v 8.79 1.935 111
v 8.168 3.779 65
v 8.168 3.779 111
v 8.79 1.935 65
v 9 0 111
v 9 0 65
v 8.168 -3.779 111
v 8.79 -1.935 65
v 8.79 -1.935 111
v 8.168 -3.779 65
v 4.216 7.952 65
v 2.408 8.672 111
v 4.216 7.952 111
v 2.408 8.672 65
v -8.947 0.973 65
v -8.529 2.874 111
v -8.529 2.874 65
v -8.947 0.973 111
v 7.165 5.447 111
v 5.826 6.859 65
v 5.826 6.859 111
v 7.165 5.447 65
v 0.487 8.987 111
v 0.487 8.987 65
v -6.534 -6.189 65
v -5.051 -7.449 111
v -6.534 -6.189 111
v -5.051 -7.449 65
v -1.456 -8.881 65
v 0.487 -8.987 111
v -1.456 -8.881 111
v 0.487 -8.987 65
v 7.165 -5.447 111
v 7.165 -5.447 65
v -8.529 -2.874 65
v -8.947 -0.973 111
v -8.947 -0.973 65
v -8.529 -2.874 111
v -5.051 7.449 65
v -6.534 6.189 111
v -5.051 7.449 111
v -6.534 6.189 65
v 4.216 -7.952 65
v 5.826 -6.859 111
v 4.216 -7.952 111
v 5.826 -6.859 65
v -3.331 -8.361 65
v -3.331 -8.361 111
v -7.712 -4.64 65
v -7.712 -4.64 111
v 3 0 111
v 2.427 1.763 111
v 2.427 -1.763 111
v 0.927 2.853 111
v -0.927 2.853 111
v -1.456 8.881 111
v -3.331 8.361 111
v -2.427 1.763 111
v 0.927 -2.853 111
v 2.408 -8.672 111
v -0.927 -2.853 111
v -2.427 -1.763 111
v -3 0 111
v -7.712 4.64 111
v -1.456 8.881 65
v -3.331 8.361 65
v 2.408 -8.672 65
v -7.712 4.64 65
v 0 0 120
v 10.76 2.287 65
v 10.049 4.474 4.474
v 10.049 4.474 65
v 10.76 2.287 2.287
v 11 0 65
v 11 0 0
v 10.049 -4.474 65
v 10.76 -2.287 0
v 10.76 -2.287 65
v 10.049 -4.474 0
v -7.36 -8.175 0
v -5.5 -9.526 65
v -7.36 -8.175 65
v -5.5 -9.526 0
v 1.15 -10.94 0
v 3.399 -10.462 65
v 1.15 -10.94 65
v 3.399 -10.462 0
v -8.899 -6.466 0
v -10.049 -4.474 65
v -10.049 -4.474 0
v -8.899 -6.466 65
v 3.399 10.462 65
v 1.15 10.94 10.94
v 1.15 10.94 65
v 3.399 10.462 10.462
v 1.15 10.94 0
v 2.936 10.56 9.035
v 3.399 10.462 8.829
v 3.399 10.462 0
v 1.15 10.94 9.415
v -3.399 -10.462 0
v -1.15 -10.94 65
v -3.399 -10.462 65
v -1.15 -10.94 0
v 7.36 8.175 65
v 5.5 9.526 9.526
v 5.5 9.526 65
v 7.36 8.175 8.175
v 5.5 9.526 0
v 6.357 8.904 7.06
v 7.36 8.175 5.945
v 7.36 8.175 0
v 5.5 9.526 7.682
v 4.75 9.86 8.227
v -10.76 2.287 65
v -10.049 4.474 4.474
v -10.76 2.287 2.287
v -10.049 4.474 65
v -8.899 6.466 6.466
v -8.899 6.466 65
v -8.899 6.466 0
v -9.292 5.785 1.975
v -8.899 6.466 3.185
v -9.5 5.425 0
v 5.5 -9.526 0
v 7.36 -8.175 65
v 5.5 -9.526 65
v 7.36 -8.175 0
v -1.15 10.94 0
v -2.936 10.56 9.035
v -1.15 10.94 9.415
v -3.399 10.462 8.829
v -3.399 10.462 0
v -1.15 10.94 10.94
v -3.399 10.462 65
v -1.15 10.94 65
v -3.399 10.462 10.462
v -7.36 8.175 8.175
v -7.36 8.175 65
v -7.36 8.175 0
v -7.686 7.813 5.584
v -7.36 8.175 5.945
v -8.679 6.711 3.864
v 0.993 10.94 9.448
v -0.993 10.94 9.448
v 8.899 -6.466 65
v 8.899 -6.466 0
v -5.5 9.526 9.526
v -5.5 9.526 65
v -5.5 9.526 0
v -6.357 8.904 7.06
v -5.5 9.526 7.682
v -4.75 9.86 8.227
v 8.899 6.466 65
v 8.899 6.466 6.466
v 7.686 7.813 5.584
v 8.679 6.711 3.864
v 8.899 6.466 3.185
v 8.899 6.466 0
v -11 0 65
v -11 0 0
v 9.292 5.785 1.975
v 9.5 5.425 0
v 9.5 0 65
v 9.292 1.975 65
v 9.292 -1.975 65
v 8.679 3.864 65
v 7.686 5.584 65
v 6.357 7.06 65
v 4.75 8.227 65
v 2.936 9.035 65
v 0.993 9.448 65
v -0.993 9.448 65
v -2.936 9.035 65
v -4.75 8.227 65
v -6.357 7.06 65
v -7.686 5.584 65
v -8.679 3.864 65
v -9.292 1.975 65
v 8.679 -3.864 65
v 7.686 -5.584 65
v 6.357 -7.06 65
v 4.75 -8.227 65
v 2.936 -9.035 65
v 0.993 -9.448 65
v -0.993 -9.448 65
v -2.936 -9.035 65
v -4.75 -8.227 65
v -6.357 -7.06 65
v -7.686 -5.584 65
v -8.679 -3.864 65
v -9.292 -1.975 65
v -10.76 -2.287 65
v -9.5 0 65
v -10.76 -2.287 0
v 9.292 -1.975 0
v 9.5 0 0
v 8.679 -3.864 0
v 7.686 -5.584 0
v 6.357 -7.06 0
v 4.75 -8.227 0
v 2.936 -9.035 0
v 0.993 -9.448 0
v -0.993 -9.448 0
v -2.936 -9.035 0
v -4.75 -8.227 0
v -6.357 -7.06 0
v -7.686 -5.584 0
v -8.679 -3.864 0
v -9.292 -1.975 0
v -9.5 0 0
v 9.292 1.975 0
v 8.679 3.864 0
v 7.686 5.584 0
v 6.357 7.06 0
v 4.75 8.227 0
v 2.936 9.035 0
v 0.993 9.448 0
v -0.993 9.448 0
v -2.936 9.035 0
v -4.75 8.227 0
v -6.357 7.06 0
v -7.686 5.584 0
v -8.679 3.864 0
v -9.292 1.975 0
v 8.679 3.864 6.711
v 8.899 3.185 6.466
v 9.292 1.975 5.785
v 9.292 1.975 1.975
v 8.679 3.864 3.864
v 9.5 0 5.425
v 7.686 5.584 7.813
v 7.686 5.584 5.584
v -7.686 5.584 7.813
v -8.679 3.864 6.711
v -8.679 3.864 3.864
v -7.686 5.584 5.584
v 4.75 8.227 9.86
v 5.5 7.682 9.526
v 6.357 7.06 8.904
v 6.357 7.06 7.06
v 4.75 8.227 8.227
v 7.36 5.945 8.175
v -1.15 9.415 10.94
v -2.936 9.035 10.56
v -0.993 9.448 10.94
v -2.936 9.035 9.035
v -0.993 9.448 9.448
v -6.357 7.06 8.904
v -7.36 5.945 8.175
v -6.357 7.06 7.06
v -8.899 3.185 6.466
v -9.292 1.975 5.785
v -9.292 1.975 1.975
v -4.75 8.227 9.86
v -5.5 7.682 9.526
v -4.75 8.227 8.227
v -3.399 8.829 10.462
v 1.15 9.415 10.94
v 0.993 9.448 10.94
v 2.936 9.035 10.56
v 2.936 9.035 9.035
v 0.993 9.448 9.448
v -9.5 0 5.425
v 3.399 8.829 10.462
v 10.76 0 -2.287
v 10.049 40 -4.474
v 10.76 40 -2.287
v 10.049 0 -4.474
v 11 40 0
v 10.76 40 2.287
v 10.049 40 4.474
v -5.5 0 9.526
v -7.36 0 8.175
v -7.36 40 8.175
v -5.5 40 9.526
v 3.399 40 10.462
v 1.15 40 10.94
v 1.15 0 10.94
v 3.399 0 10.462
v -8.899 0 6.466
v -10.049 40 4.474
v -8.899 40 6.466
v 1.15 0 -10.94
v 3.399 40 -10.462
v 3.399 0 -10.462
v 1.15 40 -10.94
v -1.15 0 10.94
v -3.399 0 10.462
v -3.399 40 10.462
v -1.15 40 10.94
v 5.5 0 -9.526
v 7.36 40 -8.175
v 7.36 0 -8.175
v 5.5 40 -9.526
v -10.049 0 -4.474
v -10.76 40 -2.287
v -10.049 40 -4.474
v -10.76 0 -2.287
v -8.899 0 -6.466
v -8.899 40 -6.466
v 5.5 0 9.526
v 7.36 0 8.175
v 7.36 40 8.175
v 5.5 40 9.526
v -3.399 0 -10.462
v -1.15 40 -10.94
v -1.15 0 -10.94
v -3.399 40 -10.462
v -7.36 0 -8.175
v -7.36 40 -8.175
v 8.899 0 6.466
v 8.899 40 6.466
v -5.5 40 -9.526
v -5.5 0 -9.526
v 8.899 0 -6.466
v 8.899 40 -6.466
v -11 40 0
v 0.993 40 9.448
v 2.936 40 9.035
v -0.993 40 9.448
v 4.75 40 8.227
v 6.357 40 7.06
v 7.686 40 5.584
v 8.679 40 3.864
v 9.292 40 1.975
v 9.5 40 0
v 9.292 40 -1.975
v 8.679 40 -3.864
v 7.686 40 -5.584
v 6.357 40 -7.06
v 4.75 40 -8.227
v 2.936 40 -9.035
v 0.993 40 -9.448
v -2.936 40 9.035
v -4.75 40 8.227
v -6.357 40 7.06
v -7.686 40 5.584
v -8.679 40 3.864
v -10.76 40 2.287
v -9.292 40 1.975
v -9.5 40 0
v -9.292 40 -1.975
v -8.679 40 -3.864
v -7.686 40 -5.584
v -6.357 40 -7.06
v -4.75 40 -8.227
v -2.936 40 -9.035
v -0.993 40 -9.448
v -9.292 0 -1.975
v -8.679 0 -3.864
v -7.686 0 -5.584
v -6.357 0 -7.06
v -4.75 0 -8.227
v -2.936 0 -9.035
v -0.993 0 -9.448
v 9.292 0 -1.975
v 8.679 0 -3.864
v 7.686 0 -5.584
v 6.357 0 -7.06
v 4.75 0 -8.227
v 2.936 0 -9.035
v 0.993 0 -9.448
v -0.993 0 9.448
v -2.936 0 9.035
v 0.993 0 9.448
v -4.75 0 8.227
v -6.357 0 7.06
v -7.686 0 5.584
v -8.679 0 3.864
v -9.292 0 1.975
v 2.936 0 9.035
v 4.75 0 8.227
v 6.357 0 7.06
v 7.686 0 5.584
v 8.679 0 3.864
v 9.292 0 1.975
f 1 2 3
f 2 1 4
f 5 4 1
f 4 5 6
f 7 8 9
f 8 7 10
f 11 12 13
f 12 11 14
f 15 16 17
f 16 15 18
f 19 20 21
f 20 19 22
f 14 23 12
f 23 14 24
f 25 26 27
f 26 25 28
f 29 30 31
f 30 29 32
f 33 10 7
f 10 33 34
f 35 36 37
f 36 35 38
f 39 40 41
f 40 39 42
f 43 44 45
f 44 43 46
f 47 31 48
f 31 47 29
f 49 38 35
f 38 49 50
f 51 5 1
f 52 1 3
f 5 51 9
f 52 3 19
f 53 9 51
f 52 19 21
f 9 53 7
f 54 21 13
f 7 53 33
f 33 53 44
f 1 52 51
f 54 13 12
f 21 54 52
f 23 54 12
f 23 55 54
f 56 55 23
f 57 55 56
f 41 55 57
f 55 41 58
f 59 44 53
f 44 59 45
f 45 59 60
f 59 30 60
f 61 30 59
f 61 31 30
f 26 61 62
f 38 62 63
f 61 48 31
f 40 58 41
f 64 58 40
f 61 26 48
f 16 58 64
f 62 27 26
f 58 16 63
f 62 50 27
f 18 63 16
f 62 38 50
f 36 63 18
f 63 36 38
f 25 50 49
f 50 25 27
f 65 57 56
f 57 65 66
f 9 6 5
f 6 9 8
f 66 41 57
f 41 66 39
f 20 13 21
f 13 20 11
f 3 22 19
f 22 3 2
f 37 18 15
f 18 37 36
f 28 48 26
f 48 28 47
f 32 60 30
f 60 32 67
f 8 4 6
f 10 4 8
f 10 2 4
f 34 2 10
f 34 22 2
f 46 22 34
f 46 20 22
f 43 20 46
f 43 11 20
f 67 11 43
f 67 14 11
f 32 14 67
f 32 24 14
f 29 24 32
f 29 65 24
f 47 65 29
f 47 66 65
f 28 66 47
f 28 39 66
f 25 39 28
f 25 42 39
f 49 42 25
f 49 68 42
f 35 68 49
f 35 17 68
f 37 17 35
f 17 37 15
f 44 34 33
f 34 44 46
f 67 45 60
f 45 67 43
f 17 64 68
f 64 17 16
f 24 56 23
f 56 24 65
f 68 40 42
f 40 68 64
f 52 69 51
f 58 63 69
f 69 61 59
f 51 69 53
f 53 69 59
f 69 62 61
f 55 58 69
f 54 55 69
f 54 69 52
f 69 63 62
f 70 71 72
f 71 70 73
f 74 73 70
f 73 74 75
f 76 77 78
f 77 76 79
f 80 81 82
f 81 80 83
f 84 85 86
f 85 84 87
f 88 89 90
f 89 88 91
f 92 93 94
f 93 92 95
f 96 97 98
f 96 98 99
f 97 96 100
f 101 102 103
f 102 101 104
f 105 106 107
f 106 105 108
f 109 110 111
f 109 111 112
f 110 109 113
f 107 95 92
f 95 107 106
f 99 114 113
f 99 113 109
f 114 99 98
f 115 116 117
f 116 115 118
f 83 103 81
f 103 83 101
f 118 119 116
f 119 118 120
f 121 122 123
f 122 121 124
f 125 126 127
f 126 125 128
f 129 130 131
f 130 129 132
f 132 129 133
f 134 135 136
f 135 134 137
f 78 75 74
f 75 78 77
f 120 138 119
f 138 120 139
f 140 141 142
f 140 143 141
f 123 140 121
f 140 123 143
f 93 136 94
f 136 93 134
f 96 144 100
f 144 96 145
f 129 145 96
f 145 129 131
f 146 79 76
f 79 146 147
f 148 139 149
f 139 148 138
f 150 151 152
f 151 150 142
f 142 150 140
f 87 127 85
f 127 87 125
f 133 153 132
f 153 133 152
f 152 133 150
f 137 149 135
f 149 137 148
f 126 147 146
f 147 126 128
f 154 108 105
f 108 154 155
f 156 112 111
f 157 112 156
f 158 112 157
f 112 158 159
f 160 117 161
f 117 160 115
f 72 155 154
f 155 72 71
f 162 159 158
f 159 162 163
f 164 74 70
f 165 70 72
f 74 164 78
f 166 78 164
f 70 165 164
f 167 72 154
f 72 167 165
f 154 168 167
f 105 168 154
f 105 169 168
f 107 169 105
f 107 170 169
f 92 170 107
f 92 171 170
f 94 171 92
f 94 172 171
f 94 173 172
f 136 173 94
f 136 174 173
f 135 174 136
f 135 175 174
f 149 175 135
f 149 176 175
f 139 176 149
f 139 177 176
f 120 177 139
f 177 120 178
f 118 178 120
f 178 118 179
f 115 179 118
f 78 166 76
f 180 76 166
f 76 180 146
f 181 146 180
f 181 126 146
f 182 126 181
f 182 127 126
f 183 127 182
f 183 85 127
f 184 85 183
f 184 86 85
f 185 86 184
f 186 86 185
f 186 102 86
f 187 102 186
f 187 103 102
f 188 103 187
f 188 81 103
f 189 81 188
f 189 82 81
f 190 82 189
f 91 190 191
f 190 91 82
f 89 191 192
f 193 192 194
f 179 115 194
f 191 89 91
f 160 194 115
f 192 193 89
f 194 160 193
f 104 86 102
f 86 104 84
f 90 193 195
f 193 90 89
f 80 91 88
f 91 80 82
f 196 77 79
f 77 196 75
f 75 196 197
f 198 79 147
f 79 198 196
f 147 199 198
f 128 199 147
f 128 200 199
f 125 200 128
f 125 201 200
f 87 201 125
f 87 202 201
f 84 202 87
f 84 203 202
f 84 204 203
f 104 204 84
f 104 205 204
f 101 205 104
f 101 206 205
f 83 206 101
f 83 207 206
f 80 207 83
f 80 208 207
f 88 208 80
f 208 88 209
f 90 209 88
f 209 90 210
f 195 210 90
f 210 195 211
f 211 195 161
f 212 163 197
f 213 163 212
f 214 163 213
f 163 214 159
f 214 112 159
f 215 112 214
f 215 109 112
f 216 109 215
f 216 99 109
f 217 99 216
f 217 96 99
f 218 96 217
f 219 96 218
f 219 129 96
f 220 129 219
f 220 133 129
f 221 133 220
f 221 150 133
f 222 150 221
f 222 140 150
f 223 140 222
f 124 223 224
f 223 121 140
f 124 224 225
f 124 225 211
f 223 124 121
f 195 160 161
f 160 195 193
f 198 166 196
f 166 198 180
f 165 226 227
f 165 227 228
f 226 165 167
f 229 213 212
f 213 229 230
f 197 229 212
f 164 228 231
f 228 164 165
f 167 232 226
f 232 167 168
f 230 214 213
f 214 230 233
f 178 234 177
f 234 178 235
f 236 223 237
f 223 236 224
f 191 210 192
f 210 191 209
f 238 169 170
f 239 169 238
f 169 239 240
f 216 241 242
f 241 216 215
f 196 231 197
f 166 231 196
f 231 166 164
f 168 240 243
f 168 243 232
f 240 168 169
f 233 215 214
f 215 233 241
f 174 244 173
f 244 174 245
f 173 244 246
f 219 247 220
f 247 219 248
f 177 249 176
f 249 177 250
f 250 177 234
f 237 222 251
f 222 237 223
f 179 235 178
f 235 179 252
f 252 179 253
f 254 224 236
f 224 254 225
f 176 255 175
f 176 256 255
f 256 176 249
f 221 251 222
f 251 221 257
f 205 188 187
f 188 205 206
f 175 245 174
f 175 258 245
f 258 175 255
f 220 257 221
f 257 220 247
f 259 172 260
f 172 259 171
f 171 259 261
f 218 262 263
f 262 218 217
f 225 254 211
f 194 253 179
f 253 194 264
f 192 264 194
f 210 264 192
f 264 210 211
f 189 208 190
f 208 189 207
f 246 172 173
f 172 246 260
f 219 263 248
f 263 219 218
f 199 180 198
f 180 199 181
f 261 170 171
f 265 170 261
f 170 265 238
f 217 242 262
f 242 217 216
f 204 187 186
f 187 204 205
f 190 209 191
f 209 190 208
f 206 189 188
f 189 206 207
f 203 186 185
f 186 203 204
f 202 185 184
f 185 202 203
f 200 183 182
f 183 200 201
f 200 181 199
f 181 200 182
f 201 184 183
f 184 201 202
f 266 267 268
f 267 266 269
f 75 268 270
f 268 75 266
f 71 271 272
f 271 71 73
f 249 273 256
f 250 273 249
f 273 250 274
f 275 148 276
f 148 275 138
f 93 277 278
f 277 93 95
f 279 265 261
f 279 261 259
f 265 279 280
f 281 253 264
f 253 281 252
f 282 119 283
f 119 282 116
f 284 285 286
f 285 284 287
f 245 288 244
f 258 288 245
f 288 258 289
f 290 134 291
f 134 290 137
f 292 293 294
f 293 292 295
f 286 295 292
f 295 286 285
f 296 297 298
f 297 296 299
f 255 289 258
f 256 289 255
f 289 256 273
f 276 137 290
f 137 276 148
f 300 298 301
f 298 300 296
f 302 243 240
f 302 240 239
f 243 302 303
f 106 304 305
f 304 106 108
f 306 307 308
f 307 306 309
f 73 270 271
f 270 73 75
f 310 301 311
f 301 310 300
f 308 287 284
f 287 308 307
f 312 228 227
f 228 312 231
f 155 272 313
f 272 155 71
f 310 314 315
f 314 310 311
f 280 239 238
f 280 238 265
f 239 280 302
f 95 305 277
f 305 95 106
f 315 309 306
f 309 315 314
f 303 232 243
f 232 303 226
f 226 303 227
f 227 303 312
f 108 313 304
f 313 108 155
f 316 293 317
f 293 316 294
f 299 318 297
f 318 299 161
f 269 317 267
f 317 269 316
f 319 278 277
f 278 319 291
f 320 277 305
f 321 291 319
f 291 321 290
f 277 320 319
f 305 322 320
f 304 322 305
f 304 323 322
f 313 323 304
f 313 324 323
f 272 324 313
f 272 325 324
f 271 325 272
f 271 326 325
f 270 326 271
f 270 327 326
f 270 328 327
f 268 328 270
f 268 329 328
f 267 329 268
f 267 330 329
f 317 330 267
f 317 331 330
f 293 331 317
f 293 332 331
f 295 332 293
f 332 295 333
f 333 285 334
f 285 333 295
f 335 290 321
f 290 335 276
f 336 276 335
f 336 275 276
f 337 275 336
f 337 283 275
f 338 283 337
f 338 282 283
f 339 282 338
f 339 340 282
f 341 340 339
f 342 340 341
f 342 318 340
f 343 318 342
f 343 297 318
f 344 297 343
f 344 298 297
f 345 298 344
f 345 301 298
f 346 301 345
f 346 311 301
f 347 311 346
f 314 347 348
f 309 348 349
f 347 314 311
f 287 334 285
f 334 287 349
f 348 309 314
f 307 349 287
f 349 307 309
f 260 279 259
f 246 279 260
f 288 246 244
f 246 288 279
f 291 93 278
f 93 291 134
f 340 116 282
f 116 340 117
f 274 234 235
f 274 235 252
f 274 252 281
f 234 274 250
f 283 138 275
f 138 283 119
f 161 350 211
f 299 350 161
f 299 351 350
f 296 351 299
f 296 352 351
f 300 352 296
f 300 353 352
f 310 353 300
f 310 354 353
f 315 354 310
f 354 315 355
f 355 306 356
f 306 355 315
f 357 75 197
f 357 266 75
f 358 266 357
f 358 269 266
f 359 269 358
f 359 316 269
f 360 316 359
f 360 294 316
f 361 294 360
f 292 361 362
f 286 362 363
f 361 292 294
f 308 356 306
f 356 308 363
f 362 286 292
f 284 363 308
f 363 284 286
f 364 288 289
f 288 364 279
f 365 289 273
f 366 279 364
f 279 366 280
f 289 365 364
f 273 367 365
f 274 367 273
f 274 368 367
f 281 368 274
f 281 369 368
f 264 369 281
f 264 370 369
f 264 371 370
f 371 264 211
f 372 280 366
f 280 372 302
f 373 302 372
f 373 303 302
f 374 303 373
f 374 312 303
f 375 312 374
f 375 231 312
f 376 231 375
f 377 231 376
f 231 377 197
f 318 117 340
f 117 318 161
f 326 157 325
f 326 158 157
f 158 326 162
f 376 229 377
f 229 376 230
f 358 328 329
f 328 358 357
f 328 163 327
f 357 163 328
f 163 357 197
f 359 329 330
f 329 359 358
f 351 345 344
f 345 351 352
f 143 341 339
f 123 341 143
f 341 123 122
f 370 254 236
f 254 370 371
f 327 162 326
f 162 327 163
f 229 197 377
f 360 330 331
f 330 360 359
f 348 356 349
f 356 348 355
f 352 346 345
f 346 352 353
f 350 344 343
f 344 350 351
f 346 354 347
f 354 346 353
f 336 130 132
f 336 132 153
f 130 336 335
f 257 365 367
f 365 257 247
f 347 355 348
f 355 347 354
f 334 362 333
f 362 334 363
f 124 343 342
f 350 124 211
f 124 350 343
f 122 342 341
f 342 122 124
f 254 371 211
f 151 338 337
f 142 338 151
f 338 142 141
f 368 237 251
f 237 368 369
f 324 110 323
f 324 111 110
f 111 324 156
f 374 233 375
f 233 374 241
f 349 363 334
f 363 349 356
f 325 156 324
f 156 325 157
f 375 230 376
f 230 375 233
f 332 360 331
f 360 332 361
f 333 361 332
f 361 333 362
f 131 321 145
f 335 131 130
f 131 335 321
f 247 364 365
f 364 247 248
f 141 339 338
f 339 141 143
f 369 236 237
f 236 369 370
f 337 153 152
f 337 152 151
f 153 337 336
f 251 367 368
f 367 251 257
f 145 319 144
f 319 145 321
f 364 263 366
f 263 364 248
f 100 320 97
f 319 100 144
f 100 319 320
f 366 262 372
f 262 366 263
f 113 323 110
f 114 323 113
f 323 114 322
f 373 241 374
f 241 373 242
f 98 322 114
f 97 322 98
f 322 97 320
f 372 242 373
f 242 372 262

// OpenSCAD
module pipe(od, id,l){
    difference(){
        cylinder(h=l,r=od/2);
        translate([0,0,-1])cylinder(h=l+2,r=id/2);
        };
    }

module nipple(){
    cylinder(h=9,r2=0, r1=9/3);}

module nixie_tube(){
    cylinder(h=46,r=18/2);
    translate([0,0,46])nipple();}


module arm(
len_up = 65,
len_out = 40,
id = 19,
od = 22){

translate([0,0,len_up])nixie_tube();
pipe(od,id,len_up);
rotate([-90,0,0])pipe(od,id,len_out);}

arm();
